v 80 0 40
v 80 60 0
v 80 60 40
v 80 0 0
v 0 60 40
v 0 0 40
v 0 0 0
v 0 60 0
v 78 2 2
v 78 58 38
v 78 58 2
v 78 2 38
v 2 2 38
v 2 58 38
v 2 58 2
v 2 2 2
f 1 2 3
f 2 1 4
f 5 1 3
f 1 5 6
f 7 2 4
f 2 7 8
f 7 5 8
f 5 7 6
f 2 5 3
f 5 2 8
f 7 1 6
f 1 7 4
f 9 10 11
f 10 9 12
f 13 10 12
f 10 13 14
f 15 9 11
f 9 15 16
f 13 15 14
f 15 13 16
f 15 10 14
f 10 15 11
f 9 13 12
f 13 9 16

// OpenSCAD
// >>> inlined library/containers.scad
// containers.scad — closed boxes, two-part enclosures, and tubes/spacers. Units mm.
//
//   snap_box(width, depth, height, wall, fn)
//     A closed, watertight box sized to its OUTER envelope [width, depth, height],
//     hollow inside. (The snap-fit lid seam itself is Phase-3 part-quality detailing;
//     Phase 1 needs the right size and a sliceable solid.)
//     Bounding box = [width, depth, height].
//
//   enclosure(inner_w, inner_d, inner_h, wall, fn)
//     A two-part enclosure sized from its INTERNAL volume; walls add on every side and
//     the lid adds on top. Bounding box = [inner_w + 2*wall, inner_d + 2*wall, inner_h + 2*wall].
//
//   tube(id, od, height, fn)
//     A plain ring / cylindrical spacer (e.g. a standoff). Bounding box = [od, od, height].

module snap_box(width = 80, depth = 60, height = 40, wall = 2, fn = 48) {
    difference() {
        cube([width, depth, height]);                        // outer solid
        translate([wall, wall, wall])                        // hollow interior
            cube([width - 2 * wall, depth - 2 * wall, height - 2 * wall]);
    }
}

module enclosure(inner_w = 80, inner_d = 50, inner_h = 30, wall = 2.5, fn = 48) {
    snap_box(inner_w + 2 * wall, inner_d + 2 * wall, inner_h + 2 * wall, wall, fn = fn);
}

module tube(id = 8, od = 16, height = 12, fn = 64) {
    eps = 0.05;
    difference() {
        cylinder(h = height, d = od, $fn = fn);
        translate([0, 0, -eps])
            cylinder(h = height + 2 * eps, d = id, $fn = fn);
    }
}

// <<< library/containers.scad;
width = 80; // [10:1:170]
depth = 60; // [10:1:170]
height = 40; // [10:1:170]
wall = 2; // [0.8:0.2:8]
snap_box(width=width, depth=depth, height=height, wall=wall);
